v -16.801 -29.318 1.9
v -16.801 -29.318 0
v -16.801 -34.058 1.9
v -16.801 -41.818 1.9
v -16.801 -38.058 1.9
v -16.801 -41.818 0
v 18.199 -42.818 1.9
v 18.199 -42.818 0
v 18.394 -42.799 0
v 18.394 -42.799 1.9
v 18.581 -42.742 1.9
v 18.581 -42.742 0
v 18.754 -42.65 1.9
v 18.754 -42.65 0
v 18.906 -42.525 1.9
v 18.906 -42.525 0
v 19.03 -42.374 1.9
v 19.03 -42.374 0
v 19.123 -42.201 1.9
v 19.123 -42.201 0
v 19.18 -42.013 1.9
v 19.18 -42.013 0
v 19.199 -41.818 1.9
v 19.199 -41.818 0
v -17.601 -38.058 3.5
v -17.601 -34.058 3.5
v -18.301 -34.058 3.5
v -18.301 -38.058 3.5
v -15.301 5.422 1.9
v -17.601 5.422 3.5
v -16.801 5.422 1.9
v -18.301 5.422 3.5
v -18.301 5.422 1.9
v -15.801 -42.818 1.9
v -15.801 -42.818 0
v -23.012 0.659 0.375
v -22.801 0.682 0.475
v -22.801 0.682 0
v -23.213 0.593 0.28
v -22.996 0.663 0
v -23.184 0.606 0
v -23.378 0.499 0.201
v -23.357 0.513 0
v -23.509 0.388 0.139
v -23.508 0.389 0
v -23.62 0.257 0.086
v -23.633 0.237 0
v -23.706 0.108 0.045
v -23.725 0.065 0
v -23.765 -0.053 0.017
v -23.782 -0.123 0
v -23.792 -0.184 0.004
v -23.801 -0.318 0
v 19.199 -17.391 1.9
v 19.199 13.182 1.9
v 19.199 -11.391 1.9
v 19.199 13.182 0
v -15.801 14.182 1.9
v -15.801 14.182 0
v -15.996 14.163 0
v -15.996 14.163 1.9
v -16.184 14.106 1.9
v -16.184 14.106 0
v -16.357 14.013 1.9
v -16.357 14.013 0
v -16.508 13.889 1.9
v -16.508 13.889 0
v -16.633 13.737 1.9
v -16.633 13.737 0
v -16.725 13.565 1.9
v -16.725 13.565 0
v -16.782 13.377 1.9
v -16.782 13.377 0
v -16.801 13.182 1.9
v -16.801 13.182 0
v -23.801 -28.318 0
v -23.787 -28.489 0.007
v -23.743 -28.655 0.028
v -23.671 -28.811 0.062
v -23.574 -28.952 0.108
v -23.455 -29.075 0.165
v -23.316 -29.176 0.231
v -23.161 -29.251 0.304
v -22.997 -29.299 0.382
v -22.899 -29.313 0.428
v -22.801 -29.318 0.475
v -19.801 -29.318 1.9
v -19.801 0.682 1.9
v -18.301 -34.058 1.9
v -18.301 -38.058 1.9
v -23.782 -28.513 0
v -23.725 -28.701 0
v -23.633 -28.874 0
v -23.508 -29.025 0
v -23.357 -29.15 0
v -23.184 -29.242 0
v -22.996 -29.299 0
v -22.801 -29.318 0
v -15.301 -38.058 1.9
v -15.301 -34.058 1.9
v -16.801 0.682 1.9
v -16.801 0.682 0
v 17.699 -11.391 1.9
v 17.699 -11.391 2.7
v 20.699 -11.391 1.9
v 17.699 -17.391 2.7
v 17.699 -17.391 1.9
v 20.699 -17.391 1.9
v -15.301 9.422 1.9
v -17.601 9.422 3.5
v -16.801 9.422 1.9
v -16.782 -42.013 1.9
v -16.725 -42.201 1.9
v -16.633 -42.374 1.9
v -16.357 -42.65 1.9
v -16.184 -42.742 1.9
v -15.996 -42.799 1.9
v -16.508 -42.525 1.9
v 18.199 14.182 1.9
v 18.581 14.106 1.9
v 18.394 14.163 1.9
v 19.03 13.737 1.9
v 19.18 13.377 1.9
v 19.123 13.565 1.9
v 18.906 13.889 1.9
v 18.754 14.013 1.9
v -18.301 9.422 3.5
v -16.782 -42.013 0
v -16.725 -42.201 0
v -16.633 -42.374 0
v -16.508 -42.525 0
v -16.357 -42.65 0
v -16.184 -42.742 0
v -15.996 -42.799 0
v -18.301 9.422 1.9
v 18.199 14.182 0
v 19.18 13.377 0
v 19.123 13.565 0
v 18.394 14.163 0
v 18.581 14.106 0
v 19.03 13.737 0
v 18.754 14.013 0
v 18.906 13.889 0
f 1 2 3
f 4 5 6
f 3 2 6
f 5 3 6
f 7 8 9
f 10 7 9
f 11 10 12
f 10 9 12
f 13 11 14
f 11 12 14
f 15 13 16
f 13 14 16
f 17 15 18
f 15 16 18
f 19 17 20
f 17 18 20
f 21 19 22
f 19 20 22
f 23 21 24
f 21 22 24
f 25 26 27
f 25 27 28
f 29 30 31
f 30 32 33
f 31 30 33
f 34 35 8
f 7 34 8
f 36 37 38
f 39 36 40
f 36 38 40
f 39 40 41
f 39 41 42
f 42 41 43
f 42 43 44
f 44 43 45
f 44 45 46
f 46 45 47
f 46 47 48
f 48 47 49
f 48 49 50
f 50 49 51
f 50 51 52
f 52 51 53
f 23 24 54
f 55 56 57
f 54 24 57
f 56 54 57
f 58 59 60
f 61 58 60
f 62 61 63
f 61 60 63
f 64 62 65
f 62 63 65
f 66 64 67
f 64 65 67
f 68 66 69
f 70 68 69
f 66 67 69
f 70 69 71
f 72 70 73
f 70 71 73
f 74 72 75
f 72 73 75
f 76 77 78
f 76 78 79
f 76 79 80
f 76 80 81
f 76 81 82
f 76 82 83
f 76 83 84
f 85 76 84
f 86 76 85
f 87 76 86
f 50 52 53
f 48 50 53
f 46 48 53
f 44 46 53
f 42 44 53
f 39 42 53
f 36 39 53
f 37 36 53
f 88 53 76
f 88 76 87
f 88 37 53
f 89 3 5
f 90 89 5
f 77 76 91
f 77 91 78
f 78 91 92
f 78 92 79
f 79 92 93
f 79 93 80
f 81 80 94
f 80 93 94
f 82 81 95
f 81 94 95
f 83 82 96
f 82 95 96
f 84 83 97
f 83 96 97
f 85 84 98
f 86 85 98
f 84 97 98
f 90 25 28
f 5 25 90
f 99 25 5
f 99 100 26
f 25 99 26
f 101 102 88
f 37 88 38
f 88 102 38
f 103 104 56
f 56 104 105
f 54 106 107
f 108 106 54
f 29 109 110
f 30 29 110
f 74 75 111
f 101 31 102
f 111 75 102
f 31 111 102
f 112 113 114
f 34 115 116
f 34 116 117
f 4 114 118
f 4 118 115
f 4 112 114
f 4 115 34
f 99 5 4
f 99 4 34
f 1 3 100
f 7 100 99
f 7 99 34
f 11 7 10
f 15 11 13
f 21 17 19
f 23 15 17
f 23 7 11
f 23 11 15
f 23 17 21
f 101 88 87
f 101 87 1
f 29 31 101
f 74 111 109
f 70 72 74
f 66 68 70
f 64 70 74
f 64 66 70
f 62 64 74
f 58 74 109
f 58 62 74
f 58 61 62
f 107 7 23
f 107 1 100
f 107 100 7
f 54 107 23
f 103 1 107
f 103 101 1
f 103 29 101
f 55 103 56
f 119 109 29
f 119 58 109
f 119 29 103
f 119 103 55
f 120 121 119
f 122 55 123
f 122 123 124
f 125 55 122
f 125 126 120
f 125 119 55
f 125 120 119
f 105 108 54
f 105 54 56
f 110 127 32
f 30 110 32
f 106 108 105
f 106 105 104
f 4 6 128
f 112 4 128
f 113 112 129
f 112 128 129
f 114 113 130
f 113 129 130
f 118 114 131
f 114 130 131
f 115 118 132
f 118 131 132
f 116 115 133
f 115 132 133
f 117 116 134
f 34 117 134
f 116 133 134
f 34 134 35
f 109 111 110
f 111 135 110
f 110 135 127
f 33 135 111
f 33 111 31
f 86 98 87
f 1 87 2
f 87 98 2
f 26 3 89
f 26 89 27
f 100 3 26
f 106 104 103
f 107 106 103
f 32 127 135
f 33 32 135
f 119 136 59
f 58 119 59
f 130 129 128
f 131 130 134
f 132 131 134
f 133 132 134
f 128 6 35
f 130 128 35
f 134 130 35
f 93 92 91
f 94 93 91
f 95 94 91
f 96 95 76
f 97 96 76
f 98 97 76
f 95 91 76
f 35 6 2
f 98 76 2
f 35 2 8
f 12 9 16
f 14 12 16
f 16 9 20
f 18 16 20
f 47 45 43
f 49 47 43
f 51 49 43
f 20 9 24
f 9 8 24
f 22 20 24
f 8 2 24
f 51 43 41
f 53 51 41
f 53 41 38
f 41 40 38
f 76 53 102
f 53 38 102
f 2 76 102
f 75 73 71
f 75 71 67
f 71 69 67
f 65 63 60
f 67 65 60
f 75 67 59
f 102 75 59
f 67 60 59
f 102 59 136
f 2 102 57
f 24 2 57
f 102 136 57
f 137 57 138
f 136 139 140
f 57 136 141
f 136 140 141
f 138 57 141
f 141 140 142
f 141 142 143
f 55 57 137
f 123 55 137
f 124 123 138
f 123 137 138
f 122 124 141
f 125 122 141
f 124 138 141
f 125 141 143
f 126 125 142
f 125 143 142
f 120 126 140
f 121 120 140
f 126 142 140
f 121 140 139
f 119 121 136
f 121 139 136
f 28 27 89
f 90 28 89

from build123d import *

# Parameters (mm, degrees)
RESSALTO_EXTRUS_O2_DEPTH = 1.9
RESSALTO_EXTRUS_O3_DEPTH = 1.5
CORTE_EXTRUS_O1_DEPTH    = 100
ESBO_O5_W                = 0.8
ESBO_O5_H                = 6
RESSALTO_EXTRUS_O4_DEPTH = 1.5
CORTE_EXTRUS_O2_DEPTH    = 100
CORTE_EXTRUS_O3_DEPTH    = 1000


with BuildPart() as part:
    # Esboço1 → Ressalto-extrusão2 (new body)
    with BuildSketch(Plane.XY):
        with BuildLine():
            Line((-23.801253488, -0.31815777), (-23.801253488, -28.31815777))
            ThreePointArc((-23.801253488, -28.31815777), (-23.50836027, -29.025264551), (-22.801253488, -29.31815777))
            Line((-22.801253488, -29.31815777), (-16.801253488, -29.31815777))
            Line((-16.801253488, -29.31815777), (-16.801253488, -41.81815777))
            ThreePointArc((-16.801253488, -41.81815777), (-16.50836027, -42.525264551), (-15.801253488, -42.81815777))
            Line((-15.801253488, -42.81815777), (18.198746512, -42.81815777))
            ThreePointArc((18.198746512, -42.81815777), (18.905853293, -42.525264551), (19.198746512, -41.81815777))
            Line((19.198746512, -41.81815777), (19.198746512, 13.18184223))
            ThreePointArc((19.198746512, 13.18184223), (18.905853293, 13.888949011), (18.198746512, 14.18184223))
            Line((18.198746512, 14.18184223), (-15.801253488, 14.18184223))
            ThreePointArc((-15.801253488, 14.18184223), (-16.50836027, 13.888949011), (-16.801253488, 13.18184223))
            Line((-16.801253488, 13.18184223), (-16.801253488, 0.68184223))
            Line((-16.801253488, 0.68184223), (-22.801253488, 0.68184223))
            ThreePointArc((-22.801253488, 0.68184223), (-23.50836027, 0.388949011), (-23.801253488, -0.31815777))
        make_face()
    extrude(amount=RESSALTO_EXTRUS_O2_DEPTH)

    # Esboço3 → Ressalto-extrusão3 (add, symmetric)
    with BuildSketch(Plane.ZY.offset(16.801253488)):
        Polygon((1.9, -35.56815777), (1.9, -34.05815777), (3.5, -34.05815777), (3.5, -38.05815777), (1.9, -38.05815777), align=None)
        Polygon((1.9, 6.93184223), (1.9, 9.42184223), (3.5, 9.42184223), (3.5, 5.42184223), (1.9, 5.42184223), align=None)
    extrude(amount=RESSALTO_EXTRUS_O3_DEPTH, both=True)

    # Esboço4 → Corte-extrusão1 (cut)
    with BuildSketch(Plane(origin=(0, 0.68184223, 0), x_dir=(1, 0, 0), z_dir=(0, 1, 0))):
        Polygon((-23.801253488, 0), (-19.801253488, -1.9), (-23.801253488, -1.9), align=None)
    extrude(amount=-CORTE_EXTRUS_O1_DEPTH, mode=Mode.SUBTRACT)

    # Esboço5 → Ressalto-extrusão4 (add, symmetric)
    with BuildSketch(Plane(origin=(19.198746512, 0, 0), x_dir=(0, 0, -1), z_dir=(1, 0, 0))):
        with Locations((-2.3, -14.390539287)):
            Rectangle(ESBO_O5_W, ESBO_O5_H)
    extrude(amount=RESSALTO_EXTRUS_O4_DEPTH, both=True)

    # Esboço6 → Corte-extrusão2 (cut)
    with BuildSketch(Plane(origin=(0, -17.390539287, 0), x_dir=(-1, 0, 0), z_dir=(0, -1, 0))):
        Polygon((-20.698746512, -1.9), (-17.698746512, -2.7), (-20.698746512, -2.7), align=None)
    extrude(amount=-CORTE_EXTRUS_O2_DEPTH, mode=Mode.SUBTRACT)

    # Esboço7 → Corte-extrusão3 (cut)
    with BuildSketch(Plane(origin=(0, 9.42184223, 0), x_dir=(1, 0, 0), z_dir=(0, 1, 0))):
        Polygon((-15.301253488, -1.9), (-17.601253488, -3.5), (-15.301253488, -3.5), align=None)
    extrude(amount=-CORTE_EXTRUS_O3_DEPTH, mode=Mode.SUBTRACT)


solid = part.part
